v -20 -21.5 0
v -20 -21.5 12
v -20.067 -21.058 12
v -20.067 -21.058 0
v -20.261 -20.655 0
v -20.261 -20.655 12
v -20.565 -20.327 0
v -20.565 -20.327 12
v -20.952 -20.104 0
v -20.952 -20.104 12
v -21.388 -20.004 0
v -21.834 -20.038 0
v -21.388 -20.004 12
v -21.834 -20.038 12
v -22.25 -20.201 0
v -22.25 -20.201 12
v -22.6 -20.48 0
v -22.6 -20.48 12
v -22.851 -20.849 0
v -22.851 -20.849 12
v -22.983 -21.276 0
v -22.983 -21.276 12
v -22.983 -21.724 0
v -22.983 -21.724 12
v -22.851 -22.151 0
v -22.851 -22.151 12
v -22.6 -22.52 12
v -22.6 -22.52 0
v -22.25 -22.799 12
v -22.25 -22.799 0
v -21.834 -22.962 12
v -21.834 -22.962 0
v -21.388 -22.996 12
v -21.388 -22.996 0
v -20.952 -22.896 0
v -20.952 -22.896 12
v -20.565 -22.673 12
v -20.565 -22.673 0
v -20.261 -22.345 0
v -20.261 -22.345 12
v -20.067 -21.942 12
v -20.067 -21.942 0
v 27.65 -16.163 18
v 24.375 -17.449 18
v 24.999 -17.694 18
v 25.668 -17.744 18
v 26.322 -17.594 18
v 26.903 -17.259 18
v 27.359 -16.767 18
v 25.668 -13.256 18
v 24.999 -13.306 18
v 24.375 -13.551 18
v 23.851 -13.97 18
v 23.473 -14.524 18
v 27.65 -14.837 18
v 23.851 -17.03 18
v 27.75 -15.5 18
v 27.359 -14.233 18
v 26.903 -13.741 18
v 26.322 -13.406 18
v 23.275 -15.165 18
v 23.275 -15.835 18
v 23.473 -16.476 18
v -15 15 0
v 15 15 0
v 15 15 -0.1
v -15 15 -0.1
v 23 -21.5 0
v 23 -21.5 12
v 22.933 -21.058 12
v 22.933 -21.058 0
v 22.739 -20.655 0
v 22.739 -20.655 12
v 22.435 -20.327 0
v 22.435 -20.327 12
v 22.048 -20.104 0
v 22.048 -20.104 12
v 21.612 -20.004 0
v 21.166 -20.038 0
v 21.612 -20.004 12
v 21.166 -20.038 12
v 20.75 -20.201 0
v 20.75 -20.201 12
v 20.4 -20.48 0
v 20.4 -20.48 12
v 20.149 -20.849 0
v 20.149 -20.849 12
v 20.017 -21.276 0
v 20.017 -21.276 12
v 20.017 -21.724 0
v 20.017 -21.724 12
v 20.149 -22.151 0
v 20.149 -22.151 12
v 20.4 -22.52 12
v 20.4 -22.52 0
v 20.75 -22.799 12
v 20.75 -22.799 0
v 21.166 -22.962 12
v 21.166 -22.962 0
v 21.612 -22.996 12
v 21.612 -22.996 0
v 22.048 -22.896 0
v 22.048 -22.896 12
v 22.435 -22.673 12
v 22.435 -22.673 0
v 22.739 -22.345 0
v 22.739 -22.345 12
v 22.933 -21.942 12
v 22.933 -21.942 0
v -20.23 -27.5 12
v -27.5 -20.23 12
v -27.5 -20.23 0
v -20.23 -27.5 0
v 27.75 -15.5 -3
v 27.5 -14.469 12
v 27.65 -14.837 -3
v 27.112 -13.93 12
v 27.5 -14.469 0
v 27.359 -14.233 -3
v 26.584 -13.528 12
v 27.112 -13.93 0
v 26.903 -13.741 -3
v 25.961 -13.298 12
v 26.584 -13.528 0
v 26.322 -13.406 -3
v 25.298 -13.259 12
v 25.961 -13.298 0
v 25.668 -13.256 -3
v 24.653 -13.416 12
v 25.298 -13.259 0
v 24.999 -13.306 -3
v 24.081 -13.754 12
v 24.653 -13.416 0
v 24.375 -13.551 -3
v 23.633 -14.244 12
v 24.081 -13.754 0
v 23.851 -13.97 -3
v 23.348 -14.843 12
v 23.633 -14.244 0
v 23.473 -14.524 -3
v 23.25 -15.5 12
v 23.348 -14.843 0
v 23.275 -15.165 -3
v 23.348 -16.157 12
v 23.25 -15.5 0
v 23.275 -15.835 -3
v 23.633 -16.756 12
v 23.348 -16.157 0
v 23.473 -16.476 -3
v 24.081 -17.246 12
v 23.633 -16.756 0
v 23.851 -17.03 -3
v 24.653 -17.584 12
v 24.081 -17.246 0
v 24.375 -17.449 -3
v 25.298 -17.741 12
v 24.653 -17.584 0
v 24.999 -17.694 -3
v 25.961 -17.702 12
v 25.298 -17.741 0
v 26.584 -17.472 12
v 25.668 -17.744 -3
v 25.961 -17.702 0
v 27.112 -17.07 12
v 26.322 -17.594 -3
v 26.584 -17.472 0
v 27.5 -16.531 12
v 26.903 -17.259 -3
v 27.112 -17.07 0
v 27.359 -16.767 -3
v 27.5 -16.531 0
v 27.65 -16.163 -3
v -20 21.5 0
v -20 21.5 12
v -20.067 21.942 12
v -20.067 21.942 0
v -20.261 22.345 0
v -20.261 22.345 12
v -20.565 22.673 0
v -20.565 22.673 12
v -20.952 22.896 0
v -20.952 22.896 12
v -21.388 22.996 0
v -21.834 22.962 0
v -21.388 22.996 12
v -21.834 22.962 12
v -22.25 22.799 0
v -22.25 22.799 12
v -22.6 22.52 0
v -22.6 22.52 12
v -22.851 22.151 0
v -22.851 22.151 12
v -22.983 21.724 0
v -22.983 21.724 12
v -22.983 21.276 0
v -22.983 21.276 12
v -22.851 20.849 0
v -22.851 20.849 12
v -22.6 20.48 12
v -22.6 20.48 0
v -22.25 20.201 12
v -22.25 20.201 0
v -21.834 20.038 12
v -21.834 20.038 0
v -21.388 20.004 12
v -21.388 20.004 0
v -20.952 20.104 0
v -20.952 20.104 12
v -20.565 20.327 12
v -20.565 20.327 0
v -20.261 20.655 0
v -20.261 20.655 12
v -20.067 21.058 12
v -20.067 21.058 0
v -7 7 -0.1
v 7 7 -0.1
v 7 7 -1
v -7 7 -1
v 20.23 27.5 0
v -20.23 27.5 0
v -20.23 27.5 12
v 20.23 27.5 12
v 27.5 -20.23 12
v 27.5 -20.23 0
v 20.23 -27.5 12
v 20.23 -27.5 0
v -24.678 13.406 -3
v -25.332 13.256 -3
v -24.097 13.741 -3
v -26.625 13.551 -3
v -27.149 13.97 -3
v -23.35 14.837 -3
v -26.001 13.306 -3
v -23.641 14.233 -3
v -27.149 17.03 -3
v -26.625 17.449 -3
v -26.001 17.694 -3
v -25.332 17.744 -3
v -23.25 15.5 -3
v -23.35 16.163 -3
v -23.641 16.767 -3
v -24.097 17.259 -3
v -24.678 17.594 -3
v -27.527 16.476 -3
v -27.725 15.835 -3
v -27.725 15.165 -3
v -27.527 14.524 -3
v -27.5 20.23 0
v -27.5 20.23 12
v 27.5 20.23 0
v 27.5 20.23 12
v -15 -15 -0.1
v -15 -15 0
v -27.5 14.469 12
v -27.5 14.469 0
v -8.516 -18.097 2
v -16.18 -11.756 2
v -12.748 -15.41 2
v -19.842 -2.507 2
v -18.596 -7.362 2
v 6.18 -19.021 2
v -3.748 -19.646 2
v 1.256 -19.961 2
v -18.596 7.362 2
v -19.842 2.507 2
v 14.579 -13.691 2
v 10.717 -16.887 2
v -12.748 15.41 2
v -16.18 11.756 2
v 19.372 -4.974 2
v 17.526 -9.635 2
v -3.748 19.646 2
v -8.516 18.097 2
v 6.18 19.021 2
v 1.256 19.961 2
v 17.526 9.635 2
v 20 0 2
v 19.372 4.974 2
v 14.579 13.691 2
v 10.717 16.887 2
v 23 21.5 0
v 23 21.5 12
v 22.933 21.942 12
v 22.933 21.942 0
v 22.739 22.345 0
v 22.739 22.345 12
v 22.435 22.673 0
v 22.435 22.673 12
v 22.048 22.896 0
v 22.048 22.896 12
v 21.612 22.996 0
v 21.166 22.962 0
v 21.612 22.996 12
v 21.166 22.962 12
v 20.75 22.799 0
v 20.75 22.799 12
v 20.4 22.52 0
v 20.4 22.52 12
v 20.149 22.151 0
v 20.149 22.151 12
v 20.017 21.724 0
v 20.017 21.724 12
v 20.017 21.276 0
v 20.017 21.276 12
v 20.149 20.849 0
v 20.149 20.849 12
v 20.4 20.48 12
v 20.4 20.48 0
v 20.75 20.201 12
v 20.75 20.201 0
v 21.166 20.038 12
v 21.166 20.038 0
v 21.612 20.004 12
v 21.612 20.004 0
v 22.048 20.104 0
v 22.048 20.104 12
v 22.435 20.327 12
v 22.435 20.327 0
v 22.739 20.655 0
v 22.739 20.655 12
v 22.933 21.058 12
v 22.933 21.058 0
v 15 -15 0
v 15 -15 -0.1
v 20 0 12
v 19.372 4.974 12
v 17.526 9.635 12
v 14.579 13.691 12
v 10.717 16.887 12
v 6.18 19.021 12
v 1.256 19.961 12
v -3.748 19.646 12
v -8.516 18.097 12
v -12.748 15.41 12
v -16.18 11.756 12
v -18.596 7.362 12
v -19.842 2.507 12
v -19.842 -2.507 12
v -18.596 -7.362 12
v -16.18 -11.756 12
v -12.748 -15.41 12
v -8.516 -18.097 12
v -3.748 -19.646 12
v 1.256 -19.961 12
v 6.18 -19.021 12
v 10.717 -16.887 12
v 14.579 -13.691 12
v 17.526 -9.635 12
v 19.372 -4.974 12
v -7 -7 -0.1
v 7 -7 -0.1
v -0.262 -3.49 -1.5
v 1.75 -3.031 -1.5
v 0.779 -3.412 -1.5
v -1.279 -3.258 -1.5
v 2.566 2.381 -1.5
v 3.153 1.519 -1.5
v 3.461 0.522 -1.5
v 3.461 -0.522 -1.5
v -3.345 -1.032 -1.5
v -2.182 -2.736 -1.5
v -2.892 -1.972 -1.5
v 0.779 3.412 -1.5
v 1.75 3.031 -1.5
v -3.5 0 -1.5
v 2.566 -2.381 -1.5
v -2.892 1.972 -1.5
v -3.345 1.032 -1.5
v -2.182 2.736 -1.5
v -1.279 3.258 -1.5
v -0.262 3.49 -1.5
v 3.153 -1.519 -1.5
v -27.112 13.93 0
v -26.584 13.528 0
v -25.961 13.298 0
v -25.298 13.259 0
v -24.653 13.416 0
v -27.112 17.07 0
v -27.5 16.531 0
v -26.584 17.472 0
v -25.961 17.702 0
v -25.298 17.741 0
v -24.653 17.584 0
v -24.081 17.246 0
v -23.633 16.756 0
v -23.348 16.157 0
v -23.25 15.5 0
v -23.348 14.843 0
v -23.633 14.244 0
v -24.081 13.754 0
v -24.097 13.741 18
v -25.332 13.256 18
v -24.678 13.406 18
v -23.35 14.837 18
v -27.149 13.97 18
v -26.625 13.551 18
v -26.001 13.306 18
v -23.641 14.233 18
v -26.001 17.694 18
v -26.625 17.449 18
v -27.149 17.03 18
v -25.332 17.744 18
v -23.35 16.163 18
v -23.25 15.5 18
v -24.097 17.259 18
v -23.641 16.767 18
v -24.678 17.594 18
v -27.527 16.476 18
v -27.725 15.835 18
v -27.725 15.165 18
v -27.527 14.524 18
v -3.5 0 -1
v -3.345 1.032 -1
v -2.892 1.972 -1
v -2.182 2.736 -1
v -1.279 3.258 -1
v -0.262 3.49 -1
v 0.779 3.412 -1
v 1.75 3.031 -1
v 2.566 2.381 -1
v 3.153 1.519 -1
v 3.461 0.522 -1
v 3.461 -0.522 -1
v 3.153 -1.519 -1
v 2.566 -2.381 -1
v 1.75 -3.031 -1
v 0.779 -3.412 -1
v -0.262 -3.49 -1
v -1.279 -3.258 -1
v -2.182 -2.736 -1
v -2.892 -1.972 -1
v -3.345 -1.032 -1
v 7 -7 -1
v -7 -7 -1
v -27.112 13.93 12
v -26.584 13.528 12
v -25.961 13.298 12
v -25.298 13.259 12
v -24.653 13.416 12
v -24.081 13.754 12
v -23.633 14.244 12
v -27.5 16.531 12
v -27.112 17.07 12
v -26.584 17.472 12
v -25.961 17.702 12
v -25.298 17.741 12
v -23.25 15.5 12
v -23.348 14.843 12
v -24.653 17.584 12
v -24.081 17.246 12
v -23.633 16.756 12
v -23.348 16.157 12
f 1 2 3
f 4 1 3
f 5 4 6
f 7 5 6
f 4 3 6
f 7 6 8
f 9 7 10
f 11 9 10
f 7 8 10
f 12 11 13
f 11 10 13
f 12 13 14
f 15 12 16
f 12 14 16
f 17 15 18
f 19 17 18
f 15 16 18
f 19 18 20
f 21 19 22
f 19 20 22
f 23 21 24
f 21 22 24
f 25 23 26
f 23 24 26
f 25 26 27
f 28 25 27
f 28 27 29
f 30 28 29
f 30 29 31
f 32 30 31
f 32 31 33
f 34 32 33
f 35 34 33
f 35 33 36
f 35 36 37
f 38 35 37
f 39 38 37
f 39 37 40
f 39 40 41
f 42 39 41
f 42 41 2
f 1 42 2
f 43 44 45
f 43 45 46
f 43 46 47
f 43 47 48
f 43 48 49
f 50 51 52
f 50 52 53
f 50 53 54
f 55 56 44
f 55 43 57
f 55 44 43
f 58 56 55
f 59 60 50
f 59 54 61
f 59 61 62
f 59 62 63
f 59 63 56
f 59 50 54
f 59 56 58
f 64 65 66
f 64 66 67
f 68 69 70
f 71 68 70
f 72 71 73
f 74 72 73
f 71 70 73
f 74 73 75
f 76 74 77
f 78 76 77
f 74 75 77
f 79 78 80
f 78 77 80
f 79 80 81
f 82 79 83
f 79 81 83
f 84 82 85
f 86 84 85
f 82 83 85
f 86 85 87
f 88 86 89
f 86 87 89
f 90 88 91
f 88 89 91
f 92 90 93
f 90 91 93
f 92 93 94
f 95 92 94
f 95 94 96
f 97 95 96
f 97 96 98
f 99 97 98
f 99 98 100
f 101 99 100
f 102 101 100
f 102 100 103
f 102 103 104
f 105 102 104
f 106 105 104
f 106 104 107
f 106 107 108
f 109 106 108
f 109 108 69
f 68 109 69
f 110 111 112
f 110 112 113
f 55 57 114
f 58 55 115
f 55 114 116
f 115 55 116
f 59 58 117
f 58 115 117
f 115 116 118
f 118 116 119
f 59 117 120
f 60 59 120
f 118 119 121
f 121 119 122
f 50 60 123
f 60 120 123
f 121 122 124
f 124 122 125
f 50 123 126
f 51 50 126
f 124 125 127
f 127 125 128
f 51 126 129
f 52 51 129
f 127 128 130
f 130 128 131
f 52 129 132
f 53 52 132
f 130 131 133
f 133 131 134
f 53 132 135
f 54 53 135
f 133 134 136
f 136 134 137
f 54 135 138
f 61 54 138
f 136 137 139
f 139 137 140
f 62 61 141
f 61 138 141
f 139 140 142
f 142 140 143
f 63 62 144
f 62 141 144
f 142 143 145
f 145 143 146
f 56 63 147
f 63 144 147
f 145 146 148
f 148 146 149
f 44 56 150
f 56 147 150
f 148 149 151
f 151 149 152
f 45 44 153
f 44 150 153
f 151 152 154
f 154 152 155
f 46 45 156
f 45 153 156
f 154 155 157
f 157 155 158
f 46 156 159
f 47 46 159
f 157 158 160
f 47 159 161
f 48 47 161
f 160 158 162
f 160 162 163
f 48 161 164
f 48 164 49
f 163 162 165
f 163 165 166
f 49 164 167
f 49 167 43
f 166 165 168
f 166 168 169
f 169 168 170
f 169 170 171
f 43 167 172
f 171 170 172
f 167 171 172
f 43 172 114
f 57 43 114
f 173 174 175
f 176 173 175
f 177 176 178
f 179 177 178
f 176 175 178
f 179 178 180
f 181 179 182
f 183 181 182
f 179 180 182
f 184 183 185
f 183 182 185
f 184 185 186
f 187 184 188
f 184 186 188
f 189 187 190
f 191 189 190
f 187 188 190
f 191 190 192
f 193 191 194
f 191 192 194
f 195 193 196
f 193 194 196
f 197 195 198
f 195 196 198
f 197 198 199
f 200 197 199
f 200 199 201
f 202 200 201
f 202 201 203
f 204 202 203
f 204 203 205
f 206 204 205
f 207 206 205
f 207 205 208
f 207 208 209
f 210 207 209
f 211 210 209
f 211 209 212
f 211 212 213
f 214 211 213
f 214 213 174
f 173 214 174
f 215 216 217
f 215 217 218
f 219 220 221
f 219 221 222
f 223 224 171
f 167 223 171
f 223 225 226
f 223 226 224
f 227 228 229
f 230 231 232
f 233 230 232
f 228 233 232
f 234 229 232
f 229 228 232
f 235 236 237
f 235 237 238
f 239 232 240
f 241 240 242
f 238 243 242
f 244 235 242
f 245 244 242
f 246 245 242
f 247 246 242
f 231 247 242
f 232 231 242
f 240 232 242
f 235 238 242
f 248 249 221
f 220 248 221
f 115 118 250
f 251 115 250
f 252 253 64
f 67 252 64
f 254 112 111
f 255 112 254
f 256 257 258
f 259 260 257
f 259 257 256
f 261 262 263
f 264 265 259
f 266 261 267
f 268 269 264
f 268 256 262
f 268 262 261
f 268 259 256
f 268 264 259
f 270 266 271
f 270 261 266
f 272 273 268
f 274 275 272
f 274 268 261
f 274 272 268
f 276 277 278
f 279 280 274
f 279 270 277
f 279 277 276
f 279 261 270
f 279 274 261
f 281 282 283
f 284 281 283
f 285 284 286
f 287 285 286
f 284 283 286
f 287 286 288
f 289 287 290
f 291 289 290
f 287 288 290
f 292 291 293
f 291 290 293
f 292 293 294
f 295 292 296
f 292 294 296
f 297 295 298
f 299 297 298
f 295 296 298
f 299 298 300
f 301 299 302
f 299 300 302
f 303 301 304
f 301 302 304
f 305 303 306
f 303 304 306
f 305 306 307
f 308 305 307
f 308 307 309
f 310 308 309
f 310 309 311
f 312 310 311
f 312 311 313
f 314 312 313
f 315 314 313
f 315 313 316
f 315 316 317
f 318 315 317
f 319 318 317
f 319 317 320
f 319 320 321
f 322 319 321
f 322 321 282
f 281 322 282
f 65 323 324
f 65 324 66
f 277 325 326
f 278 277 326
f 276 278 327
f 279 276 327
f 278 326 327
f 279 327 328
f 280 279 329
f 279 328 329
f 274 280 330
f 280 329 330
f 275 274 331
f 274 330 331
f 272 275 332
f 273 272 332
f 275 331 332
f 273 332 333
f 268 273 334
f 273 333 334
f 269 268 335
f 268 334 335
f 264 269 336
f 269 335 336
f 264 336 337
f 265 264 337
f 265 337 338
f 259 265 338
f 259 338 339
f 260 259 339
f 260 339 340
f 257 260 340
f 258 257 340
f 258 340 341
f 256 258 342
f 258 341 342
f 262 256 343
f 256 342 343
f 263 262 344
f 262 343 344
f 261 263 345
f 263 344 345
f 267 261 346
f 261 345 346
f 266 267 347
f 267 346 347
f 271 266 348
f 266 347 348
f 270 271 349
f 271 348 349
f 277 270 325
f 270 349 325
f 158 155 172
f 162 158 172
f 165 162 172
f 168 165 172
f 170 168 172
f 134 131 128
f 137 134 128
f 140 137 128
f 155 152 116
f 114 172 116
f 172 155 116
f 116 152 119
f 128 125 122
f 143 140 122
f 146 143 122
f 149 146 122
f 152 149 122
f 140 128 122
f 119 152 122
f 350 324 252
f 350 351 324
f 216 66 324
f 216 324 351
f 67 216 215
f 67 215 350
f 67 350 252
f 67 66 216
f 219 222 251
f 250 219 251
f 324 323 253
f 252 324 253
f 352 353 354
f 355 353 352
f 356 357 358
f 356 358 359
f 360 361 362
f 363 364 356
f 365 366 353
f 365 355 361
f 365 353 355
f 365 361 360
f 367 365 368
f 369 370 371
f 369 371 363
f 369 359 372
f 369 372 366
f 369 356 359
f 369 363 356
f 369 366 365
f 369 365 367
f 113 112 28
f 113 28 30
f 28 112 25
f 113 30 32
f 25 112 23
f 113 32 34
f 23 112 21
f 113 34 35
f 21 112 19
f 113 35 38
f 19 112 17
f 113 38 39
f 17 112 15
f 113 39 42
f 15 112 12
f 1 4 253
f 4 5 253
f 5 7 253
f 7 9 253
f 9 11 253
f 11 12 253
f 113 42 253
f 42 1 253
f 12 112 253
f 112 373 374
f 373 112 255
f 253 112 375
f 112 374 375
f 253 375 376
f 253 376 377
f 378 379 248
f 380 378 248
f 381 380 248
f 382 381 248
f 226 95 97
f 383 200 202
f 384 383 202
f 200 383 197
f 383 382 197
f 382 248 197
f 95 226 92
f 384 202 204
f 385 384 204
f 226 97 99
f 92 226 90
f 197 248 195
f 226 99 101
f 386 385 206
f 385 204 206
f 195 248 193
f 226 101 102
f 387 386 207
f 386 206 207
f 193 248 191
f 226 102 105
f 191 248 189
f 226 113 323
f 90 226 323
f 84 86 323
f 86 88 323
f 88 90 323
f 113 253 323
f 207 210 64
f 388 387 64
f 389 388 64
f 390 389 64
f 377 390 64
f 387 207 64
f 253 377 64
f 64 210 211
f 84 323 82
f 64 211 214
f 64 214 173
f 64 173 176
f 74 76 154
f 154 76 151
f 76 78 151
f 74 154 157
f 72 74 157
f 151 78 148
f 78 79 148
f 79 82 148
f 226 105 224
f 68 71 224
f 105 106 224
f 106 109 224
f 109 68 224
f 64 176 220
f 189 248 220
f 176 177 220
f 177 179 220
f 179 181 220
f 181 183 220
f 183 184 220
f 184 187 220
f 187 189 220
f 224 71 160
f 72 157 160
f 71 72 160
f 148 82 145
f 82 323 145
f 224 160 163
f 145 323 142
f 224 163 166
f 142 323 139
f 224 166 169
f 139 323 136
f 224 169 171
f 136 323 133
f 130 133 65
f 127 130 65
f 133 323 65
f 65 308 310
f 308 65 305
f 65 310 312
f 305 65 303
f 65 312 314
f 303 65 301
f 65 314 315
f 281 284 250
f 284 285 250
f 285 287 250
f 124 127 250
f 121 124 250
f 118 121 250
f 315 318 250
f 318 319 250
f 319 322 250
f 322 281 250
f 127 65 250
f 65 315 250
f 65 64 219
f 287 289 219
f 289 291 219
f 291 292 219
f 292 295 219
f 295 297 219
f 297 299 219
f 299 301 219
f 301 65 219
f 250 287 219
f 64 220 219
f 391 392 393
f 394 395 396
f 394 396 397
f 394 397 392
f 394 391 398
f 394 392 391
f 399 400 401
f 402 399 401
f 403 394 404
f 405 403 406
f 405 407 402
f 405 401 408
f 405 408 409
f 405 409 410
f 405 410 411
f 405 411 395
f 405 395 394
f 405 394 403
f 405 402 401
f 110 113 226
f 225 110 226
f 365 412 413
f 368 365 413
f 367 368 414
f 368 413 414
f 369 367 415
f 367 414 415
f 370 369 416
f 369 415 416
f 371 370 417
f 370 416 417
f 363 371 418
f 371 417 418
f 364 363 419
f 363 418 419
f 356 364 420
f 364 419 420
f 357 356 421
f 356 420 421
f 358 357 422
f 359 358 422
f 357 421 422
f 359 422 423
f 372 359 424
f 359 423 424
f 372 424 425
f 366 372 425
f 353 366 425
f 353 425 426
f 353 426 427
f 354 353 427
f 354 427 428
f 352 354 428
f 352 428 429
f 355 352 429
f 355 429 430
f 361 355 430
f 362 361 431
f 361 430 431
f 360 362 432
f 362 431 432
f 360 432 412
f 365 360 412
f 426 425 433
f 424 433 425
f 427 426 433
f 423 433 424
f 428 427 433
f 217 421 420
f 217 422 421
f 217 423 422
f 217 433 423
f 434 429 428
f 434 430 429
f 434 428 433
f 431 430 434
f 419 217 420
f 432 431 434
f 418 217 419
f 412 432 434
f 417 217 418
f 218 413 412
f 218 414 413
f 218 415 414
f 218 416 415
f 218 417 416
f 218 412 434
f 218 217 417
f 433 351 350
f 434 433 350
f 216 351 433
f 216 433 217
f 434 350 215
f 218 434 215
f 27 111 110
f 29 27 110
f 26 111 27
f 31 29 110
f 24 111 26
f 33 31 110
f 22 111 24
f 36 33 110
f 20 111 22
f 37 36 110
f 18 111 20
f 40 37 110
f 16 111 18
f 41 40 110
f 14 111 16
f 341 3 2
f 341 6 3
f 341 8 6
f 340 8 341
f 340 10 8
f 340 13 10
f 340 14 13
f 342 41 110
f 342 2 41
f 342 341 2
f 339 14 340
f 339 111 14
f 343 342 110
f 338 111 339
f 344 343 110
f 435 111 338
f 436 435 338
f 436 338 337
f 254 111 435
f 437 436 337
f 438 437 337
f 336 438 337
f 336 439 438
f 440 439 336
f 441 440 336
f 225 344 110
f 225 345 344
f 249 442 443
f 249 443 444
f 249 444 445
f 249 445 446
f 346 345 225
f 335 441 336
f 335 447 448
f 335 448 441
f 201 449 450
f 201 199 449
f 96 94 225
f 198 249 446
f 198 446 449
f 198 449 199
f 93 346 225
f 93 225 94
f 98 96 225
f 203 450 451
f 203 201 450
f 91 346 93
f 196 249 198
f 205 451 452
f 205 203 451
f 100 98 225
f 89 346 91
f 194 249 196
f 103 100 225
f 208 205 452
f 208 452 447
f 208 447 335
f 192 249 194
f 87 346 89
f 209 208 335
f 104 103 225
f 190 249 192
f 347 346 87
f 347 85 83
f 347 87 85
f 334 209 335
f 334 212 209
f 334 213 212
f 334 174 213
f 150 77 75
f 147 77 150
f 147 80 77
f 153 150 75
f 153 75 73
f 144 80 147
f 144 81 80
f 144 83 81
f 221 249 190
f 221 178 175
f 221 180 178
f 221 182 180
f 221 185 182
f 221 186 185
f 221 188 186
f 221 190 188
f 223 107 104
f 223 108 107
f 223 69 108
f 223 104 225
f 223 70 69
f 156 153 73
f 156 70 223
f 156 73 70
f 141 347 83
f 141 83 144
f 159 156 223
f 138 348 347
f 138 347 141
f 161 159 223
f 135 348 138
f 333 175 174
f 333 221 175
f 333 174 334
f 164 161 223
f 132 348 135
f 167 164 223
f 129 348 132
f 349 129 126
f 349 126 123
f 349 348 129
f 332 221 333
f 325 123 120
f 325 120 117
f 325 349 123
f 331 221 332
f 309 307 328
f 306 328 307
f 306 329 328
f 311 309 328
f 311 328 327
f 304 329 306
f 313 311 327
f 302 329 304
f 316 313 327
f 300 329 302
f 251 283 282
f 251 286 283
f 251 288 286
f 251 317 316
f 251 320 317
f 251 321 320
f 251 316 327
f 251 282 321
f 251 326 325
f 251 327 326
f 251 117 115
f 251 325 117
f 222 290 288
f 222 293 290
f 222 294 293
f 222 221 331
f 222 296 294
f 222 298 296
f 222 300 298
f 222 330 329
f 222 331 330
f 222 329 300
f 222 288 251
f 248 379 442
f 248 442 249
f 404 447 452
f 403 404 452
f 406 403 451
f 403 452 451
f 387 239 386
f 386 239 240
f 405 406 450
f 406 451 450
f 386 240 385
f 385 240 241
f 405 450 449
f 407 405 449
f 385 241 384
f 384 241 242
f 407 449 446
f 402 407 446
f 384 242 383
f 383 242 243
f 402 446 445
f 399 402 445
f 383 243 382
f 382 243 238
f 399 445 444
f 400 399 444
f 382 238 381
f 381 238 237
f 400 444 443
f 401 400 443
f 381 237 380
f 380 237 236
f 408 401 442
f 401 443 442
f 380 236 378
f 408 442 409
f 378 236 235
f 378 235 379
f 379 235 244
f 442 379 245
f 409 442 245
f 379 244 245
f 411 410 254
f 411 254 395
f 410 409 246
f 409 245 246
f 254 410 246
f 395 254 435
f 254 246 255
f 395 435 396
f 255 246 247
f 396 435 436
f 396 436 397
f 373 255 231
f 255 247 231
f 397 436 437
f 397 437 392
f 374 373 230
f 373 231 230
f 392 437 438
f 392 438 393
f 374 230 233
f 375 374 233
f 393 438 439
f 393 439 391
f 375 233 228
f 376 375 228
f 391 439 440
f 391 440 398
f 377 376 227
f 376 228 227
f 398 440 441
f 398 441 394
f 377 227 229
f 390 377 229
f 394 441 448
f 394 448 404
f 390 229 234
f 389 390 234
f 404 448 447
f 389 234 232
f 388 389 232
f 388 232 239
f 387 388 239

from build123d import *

# Parameters (mm, degrees)
SKETCH_1_W           = 55
SKETCH_1_H           = 55
EXTRUDE_1_DEPTH      = 12
CUT_EXTRUDE_1_REACH  = 42.7
SKETCH_2_R           = 1.5
SKETCH_3_R           = 20
CUT_EXTRUDE_2_DEPTH  = 10
CUT_EXTRUDE_3_REACH  = 42.7
EXTRUDE_2_DEPTH      = 6
EXTRUDE_2_DEPTH_BACK = 15
SKETCH_5_R           = 2.25
SKETCH_6_W           = 14
SKETCH_6_H           = 14
EXTRUDE_3_DEPTH      = 1
SKETCH_7_R           = 3.5
EXTRUDE_4_DEPTH      = 0.5
SKETCH_8_W           = 30
SKETCH_8_H           = 30
EXTRUDE_5_DEPTH      = 0.1


with BuildPart() as part:
    # 草图1 → 凸台-拉伸1 (new body)
    with BuildSketch(Plane.XY):
        Rectangle(SKETCH_1_W, SKETCH_1_H)
    extrude(amount=EXTRUDE_1_DEPTH)

    # 草图2 → 切除-拉伸1 (cut, up to next)
    with BuildSketch(Plane.XY.offset(12), mode=Mode.PRIVATE) as cut_extrude_1_sk1:
        with Locations((21.5, 21.5)):
            Circle(SKETCH_2_R)
    cut_extrude_1_tool1 = extrude(cut_extrude_1_sk1.sketch, amount=-CUT_EXTRUDE_1_REACH, mode=Mode.PRIVATE) & part.part
    # 草图2 → 切除-拉伸1 (cut, up to next)
    with BuildSketch(Plane.XY.offset(12), mode=Mode.PRIVATE) as cut_extrude_1_sk2:
        with Locations((21.5, -21.5)):
            Circle(SKETCH_2_R)
    cut_extrude_1_tool2 = extrude(cut_extrude_1_sk2.sketch, amount=-CUT_EXTRUDE_1_REACH, mode=Mode.PRIVATE) & part.part
    # 草图2 → 切除-拉伸1 (cut, up to next)
    with BuildSketch(Plane.XY.offset(12), mode=Mode.PRIVATE) as cut_extrude_1_sk3:
        with Locations((-21.5, -21.5)):
            Circle(SKETCH_2_R)
    cut_extrude_1_tool3 = extrude(cut_extrude_1_sk3.sketch, amount=-CUT_EXTRUDE_1_REACH, mode=Mode.PRIVATE) & part.part
    # 草图2 → 切除-拉伸1 (cut, up to next)
    with BuildSketch(Plane.XY.offset(12), mode=Mode.PRIVATE) as cut_extrude_1_sk4:
        with Locations((-21.5, 21.5)):
            Circle(SKETCH_2_R)
    cut_extrude_1_tool4 = extrude(cut_extrude_1_sk4.sketch, amount=-CUT_EXTRUDE_1_REACH, mode=Mode.PRIVATE) & part.part
    add(cut_extrude_1_tool1.solids().sort_by_distance((21.5, 21.5, 12))[0], mode=Mode.SUBTRACT)
    add(cut_extrude_1_tool2.solids().sort_by_distance((21.5, -21.5, 12))[0], mode=Mode.SUBTRACT)
    add(cut_extrude_1_tool3.solids().sort_by_distance((-21.5, -21.5, 12))[0], mode=Mode.SUBTRACT)
    add(cut_extrude_1_tool4.solids().sort_by_distance((-21.5, 21.5, 12))[0], mode=Mode.SUBTRACT)

    # 草图3 → 切除-拉伸2 (cut)
    with BuildSketch(Plane.XY.offset(12)):
        Circle(SKETCH_3_R)
    extrude(amount=-CUT_EXTRUDE_2_DEPTH, mode=Mode.SUBTRACT)

    # 草图4 → 切除-拉伸3 (cut, up to next)
    with BuildSketch(Plane.XY.offset(12), mode=Mode.PRIVATE) as cut_extrude_3_sk1:
        Polygon((-27.5, 20.22970773), (-20.22970773, 27.5), (-27.5, 27.5), align=None)
    cut_extrude_3_tool1 = extrude(cut_extrude_3_sk1.sketch, amount=-CUT_EXTRUDE_3_REACH, mode=Mode.PRIVATE) & part.part
    # 草图4 → 切除-拉伸3 (cut, up to next)
    with BuildSketch(Plane.XY.offset(12), mode=Mode.PRIVATE) as cut_extrude_3_sk2:
        Polygon((20.22970773, -27.5), (27.5, -20.22970773), (27.5, -27.5), align=None)
    cut_extrude_3_tool2 = extrude(cut_extrude_3_sk2.sketch, amount=-CUT_EXTRUDE_3_REACH, mode=Mode.PRIVATE) & part.part
    # 草图4 → 切除-拉伸3 (cut, up to next)
    with BuildSketch(Plane.XY.offset(12), mode=Mode.PRIVATE) as cut_extrude_3_sk3:
        Polygon((20.22970773, 27.5), (27.5, 20.22970773), (27.5, 27.5), align=None)
    cut_extrude_3_tool3 = extrude(cut_extrude_3_sk3.sketch, amount=-CUT_EXTRUDE_3_REACH, mode=Mode.PRIVATE) & part.part
    # 草图4 → 切除-拉伸3 (cut, up to next)
    with BuildSketch(Plane.XY.offset(12), mode=Mode.PRIVATE) as cut_extrude_3_sk4:
        Polygon((-20.22970773, -27.5), (-27.5, -27.5), (-27.5, -20.22970773), align=None)
    cut_extrude_3_tool4 = extrude(cut_extrude_3_sk4.sketch, amount=-CUT_EXTRUDE_3_REACH, mode=Mode.PRIVATE) & part.part
    add(cut_extrude_3_tool1.solids().sort_by_distance((-25.076569, 25.076569, 12))[0], mode=Mode.SUBTRACT)
    add(cut_extrude_3_tool2.solids().sort_by_distance((25.076569, -25.076569, 12))[0], mode=Mode.SUBTRACT)
    add(cut_extrude_3_tool3.solids().sort_by_distance((25.076569, 25.076569, 12))[0], mode=Mode.SUBTRACT)
    add(cut_extrude_3_tool4.solids().sort_by_distance((-25.076569, -25.076569, 12))[0], mode=Mode.SUBTRACT)

    # 草图5 → 凸台-拉伸2 (add, two sides: drawn at the far end of the back side and taken through both)
    with BuildSketch(Plane.XY.offset(12).offset(-EXTRUDE_2_DEPTH_BACK)):
        with Locations((-25.5, 15.5)):
            Circle(SKETCH_5_R)
        with Locations((25.5, -15.5)):
            Circle(SKETCH_5_R)
    extrude(amount=EXTRUDE_2_DEPTH + EXTRUDE_2_DEPTH_BACK)

    # 草图6 → 凸台-拉伸3 (add)
    with BuildSketch(Plane(origin=(0, 0, 0), x_dir=(-1, 0, 0), z_dir=(0, 0, -1))):
        Rectangle(SKETCH_6_W, SKETCH_6_H)
    extrude(amount=EXTRUDE_3_DEPTH)

    # 草图7 → 凸台-拉伸4 (add)
    with BuildSketch(Plane(origin=(0, 0, -1), x_dir=(-1, 0, 0), z_dir=(0, 0, -1))):
        Circle(SKETCH_7_R)
    extrude(amount=EXTRUDE_4_DEPTH)

    # 草图8 → 凸台-拉伸5 (add)
    with BuildSketch(Plane(origin=(0, 0, 0), x_dir=(-1, 0, 0), z_dir=(0, 0, -1))):
        Rectangle(SKETCH_8_W, SKETCH_8_H)
    extrude(amount=EXTRUDE_5_DEPTH)


solid = part.part
